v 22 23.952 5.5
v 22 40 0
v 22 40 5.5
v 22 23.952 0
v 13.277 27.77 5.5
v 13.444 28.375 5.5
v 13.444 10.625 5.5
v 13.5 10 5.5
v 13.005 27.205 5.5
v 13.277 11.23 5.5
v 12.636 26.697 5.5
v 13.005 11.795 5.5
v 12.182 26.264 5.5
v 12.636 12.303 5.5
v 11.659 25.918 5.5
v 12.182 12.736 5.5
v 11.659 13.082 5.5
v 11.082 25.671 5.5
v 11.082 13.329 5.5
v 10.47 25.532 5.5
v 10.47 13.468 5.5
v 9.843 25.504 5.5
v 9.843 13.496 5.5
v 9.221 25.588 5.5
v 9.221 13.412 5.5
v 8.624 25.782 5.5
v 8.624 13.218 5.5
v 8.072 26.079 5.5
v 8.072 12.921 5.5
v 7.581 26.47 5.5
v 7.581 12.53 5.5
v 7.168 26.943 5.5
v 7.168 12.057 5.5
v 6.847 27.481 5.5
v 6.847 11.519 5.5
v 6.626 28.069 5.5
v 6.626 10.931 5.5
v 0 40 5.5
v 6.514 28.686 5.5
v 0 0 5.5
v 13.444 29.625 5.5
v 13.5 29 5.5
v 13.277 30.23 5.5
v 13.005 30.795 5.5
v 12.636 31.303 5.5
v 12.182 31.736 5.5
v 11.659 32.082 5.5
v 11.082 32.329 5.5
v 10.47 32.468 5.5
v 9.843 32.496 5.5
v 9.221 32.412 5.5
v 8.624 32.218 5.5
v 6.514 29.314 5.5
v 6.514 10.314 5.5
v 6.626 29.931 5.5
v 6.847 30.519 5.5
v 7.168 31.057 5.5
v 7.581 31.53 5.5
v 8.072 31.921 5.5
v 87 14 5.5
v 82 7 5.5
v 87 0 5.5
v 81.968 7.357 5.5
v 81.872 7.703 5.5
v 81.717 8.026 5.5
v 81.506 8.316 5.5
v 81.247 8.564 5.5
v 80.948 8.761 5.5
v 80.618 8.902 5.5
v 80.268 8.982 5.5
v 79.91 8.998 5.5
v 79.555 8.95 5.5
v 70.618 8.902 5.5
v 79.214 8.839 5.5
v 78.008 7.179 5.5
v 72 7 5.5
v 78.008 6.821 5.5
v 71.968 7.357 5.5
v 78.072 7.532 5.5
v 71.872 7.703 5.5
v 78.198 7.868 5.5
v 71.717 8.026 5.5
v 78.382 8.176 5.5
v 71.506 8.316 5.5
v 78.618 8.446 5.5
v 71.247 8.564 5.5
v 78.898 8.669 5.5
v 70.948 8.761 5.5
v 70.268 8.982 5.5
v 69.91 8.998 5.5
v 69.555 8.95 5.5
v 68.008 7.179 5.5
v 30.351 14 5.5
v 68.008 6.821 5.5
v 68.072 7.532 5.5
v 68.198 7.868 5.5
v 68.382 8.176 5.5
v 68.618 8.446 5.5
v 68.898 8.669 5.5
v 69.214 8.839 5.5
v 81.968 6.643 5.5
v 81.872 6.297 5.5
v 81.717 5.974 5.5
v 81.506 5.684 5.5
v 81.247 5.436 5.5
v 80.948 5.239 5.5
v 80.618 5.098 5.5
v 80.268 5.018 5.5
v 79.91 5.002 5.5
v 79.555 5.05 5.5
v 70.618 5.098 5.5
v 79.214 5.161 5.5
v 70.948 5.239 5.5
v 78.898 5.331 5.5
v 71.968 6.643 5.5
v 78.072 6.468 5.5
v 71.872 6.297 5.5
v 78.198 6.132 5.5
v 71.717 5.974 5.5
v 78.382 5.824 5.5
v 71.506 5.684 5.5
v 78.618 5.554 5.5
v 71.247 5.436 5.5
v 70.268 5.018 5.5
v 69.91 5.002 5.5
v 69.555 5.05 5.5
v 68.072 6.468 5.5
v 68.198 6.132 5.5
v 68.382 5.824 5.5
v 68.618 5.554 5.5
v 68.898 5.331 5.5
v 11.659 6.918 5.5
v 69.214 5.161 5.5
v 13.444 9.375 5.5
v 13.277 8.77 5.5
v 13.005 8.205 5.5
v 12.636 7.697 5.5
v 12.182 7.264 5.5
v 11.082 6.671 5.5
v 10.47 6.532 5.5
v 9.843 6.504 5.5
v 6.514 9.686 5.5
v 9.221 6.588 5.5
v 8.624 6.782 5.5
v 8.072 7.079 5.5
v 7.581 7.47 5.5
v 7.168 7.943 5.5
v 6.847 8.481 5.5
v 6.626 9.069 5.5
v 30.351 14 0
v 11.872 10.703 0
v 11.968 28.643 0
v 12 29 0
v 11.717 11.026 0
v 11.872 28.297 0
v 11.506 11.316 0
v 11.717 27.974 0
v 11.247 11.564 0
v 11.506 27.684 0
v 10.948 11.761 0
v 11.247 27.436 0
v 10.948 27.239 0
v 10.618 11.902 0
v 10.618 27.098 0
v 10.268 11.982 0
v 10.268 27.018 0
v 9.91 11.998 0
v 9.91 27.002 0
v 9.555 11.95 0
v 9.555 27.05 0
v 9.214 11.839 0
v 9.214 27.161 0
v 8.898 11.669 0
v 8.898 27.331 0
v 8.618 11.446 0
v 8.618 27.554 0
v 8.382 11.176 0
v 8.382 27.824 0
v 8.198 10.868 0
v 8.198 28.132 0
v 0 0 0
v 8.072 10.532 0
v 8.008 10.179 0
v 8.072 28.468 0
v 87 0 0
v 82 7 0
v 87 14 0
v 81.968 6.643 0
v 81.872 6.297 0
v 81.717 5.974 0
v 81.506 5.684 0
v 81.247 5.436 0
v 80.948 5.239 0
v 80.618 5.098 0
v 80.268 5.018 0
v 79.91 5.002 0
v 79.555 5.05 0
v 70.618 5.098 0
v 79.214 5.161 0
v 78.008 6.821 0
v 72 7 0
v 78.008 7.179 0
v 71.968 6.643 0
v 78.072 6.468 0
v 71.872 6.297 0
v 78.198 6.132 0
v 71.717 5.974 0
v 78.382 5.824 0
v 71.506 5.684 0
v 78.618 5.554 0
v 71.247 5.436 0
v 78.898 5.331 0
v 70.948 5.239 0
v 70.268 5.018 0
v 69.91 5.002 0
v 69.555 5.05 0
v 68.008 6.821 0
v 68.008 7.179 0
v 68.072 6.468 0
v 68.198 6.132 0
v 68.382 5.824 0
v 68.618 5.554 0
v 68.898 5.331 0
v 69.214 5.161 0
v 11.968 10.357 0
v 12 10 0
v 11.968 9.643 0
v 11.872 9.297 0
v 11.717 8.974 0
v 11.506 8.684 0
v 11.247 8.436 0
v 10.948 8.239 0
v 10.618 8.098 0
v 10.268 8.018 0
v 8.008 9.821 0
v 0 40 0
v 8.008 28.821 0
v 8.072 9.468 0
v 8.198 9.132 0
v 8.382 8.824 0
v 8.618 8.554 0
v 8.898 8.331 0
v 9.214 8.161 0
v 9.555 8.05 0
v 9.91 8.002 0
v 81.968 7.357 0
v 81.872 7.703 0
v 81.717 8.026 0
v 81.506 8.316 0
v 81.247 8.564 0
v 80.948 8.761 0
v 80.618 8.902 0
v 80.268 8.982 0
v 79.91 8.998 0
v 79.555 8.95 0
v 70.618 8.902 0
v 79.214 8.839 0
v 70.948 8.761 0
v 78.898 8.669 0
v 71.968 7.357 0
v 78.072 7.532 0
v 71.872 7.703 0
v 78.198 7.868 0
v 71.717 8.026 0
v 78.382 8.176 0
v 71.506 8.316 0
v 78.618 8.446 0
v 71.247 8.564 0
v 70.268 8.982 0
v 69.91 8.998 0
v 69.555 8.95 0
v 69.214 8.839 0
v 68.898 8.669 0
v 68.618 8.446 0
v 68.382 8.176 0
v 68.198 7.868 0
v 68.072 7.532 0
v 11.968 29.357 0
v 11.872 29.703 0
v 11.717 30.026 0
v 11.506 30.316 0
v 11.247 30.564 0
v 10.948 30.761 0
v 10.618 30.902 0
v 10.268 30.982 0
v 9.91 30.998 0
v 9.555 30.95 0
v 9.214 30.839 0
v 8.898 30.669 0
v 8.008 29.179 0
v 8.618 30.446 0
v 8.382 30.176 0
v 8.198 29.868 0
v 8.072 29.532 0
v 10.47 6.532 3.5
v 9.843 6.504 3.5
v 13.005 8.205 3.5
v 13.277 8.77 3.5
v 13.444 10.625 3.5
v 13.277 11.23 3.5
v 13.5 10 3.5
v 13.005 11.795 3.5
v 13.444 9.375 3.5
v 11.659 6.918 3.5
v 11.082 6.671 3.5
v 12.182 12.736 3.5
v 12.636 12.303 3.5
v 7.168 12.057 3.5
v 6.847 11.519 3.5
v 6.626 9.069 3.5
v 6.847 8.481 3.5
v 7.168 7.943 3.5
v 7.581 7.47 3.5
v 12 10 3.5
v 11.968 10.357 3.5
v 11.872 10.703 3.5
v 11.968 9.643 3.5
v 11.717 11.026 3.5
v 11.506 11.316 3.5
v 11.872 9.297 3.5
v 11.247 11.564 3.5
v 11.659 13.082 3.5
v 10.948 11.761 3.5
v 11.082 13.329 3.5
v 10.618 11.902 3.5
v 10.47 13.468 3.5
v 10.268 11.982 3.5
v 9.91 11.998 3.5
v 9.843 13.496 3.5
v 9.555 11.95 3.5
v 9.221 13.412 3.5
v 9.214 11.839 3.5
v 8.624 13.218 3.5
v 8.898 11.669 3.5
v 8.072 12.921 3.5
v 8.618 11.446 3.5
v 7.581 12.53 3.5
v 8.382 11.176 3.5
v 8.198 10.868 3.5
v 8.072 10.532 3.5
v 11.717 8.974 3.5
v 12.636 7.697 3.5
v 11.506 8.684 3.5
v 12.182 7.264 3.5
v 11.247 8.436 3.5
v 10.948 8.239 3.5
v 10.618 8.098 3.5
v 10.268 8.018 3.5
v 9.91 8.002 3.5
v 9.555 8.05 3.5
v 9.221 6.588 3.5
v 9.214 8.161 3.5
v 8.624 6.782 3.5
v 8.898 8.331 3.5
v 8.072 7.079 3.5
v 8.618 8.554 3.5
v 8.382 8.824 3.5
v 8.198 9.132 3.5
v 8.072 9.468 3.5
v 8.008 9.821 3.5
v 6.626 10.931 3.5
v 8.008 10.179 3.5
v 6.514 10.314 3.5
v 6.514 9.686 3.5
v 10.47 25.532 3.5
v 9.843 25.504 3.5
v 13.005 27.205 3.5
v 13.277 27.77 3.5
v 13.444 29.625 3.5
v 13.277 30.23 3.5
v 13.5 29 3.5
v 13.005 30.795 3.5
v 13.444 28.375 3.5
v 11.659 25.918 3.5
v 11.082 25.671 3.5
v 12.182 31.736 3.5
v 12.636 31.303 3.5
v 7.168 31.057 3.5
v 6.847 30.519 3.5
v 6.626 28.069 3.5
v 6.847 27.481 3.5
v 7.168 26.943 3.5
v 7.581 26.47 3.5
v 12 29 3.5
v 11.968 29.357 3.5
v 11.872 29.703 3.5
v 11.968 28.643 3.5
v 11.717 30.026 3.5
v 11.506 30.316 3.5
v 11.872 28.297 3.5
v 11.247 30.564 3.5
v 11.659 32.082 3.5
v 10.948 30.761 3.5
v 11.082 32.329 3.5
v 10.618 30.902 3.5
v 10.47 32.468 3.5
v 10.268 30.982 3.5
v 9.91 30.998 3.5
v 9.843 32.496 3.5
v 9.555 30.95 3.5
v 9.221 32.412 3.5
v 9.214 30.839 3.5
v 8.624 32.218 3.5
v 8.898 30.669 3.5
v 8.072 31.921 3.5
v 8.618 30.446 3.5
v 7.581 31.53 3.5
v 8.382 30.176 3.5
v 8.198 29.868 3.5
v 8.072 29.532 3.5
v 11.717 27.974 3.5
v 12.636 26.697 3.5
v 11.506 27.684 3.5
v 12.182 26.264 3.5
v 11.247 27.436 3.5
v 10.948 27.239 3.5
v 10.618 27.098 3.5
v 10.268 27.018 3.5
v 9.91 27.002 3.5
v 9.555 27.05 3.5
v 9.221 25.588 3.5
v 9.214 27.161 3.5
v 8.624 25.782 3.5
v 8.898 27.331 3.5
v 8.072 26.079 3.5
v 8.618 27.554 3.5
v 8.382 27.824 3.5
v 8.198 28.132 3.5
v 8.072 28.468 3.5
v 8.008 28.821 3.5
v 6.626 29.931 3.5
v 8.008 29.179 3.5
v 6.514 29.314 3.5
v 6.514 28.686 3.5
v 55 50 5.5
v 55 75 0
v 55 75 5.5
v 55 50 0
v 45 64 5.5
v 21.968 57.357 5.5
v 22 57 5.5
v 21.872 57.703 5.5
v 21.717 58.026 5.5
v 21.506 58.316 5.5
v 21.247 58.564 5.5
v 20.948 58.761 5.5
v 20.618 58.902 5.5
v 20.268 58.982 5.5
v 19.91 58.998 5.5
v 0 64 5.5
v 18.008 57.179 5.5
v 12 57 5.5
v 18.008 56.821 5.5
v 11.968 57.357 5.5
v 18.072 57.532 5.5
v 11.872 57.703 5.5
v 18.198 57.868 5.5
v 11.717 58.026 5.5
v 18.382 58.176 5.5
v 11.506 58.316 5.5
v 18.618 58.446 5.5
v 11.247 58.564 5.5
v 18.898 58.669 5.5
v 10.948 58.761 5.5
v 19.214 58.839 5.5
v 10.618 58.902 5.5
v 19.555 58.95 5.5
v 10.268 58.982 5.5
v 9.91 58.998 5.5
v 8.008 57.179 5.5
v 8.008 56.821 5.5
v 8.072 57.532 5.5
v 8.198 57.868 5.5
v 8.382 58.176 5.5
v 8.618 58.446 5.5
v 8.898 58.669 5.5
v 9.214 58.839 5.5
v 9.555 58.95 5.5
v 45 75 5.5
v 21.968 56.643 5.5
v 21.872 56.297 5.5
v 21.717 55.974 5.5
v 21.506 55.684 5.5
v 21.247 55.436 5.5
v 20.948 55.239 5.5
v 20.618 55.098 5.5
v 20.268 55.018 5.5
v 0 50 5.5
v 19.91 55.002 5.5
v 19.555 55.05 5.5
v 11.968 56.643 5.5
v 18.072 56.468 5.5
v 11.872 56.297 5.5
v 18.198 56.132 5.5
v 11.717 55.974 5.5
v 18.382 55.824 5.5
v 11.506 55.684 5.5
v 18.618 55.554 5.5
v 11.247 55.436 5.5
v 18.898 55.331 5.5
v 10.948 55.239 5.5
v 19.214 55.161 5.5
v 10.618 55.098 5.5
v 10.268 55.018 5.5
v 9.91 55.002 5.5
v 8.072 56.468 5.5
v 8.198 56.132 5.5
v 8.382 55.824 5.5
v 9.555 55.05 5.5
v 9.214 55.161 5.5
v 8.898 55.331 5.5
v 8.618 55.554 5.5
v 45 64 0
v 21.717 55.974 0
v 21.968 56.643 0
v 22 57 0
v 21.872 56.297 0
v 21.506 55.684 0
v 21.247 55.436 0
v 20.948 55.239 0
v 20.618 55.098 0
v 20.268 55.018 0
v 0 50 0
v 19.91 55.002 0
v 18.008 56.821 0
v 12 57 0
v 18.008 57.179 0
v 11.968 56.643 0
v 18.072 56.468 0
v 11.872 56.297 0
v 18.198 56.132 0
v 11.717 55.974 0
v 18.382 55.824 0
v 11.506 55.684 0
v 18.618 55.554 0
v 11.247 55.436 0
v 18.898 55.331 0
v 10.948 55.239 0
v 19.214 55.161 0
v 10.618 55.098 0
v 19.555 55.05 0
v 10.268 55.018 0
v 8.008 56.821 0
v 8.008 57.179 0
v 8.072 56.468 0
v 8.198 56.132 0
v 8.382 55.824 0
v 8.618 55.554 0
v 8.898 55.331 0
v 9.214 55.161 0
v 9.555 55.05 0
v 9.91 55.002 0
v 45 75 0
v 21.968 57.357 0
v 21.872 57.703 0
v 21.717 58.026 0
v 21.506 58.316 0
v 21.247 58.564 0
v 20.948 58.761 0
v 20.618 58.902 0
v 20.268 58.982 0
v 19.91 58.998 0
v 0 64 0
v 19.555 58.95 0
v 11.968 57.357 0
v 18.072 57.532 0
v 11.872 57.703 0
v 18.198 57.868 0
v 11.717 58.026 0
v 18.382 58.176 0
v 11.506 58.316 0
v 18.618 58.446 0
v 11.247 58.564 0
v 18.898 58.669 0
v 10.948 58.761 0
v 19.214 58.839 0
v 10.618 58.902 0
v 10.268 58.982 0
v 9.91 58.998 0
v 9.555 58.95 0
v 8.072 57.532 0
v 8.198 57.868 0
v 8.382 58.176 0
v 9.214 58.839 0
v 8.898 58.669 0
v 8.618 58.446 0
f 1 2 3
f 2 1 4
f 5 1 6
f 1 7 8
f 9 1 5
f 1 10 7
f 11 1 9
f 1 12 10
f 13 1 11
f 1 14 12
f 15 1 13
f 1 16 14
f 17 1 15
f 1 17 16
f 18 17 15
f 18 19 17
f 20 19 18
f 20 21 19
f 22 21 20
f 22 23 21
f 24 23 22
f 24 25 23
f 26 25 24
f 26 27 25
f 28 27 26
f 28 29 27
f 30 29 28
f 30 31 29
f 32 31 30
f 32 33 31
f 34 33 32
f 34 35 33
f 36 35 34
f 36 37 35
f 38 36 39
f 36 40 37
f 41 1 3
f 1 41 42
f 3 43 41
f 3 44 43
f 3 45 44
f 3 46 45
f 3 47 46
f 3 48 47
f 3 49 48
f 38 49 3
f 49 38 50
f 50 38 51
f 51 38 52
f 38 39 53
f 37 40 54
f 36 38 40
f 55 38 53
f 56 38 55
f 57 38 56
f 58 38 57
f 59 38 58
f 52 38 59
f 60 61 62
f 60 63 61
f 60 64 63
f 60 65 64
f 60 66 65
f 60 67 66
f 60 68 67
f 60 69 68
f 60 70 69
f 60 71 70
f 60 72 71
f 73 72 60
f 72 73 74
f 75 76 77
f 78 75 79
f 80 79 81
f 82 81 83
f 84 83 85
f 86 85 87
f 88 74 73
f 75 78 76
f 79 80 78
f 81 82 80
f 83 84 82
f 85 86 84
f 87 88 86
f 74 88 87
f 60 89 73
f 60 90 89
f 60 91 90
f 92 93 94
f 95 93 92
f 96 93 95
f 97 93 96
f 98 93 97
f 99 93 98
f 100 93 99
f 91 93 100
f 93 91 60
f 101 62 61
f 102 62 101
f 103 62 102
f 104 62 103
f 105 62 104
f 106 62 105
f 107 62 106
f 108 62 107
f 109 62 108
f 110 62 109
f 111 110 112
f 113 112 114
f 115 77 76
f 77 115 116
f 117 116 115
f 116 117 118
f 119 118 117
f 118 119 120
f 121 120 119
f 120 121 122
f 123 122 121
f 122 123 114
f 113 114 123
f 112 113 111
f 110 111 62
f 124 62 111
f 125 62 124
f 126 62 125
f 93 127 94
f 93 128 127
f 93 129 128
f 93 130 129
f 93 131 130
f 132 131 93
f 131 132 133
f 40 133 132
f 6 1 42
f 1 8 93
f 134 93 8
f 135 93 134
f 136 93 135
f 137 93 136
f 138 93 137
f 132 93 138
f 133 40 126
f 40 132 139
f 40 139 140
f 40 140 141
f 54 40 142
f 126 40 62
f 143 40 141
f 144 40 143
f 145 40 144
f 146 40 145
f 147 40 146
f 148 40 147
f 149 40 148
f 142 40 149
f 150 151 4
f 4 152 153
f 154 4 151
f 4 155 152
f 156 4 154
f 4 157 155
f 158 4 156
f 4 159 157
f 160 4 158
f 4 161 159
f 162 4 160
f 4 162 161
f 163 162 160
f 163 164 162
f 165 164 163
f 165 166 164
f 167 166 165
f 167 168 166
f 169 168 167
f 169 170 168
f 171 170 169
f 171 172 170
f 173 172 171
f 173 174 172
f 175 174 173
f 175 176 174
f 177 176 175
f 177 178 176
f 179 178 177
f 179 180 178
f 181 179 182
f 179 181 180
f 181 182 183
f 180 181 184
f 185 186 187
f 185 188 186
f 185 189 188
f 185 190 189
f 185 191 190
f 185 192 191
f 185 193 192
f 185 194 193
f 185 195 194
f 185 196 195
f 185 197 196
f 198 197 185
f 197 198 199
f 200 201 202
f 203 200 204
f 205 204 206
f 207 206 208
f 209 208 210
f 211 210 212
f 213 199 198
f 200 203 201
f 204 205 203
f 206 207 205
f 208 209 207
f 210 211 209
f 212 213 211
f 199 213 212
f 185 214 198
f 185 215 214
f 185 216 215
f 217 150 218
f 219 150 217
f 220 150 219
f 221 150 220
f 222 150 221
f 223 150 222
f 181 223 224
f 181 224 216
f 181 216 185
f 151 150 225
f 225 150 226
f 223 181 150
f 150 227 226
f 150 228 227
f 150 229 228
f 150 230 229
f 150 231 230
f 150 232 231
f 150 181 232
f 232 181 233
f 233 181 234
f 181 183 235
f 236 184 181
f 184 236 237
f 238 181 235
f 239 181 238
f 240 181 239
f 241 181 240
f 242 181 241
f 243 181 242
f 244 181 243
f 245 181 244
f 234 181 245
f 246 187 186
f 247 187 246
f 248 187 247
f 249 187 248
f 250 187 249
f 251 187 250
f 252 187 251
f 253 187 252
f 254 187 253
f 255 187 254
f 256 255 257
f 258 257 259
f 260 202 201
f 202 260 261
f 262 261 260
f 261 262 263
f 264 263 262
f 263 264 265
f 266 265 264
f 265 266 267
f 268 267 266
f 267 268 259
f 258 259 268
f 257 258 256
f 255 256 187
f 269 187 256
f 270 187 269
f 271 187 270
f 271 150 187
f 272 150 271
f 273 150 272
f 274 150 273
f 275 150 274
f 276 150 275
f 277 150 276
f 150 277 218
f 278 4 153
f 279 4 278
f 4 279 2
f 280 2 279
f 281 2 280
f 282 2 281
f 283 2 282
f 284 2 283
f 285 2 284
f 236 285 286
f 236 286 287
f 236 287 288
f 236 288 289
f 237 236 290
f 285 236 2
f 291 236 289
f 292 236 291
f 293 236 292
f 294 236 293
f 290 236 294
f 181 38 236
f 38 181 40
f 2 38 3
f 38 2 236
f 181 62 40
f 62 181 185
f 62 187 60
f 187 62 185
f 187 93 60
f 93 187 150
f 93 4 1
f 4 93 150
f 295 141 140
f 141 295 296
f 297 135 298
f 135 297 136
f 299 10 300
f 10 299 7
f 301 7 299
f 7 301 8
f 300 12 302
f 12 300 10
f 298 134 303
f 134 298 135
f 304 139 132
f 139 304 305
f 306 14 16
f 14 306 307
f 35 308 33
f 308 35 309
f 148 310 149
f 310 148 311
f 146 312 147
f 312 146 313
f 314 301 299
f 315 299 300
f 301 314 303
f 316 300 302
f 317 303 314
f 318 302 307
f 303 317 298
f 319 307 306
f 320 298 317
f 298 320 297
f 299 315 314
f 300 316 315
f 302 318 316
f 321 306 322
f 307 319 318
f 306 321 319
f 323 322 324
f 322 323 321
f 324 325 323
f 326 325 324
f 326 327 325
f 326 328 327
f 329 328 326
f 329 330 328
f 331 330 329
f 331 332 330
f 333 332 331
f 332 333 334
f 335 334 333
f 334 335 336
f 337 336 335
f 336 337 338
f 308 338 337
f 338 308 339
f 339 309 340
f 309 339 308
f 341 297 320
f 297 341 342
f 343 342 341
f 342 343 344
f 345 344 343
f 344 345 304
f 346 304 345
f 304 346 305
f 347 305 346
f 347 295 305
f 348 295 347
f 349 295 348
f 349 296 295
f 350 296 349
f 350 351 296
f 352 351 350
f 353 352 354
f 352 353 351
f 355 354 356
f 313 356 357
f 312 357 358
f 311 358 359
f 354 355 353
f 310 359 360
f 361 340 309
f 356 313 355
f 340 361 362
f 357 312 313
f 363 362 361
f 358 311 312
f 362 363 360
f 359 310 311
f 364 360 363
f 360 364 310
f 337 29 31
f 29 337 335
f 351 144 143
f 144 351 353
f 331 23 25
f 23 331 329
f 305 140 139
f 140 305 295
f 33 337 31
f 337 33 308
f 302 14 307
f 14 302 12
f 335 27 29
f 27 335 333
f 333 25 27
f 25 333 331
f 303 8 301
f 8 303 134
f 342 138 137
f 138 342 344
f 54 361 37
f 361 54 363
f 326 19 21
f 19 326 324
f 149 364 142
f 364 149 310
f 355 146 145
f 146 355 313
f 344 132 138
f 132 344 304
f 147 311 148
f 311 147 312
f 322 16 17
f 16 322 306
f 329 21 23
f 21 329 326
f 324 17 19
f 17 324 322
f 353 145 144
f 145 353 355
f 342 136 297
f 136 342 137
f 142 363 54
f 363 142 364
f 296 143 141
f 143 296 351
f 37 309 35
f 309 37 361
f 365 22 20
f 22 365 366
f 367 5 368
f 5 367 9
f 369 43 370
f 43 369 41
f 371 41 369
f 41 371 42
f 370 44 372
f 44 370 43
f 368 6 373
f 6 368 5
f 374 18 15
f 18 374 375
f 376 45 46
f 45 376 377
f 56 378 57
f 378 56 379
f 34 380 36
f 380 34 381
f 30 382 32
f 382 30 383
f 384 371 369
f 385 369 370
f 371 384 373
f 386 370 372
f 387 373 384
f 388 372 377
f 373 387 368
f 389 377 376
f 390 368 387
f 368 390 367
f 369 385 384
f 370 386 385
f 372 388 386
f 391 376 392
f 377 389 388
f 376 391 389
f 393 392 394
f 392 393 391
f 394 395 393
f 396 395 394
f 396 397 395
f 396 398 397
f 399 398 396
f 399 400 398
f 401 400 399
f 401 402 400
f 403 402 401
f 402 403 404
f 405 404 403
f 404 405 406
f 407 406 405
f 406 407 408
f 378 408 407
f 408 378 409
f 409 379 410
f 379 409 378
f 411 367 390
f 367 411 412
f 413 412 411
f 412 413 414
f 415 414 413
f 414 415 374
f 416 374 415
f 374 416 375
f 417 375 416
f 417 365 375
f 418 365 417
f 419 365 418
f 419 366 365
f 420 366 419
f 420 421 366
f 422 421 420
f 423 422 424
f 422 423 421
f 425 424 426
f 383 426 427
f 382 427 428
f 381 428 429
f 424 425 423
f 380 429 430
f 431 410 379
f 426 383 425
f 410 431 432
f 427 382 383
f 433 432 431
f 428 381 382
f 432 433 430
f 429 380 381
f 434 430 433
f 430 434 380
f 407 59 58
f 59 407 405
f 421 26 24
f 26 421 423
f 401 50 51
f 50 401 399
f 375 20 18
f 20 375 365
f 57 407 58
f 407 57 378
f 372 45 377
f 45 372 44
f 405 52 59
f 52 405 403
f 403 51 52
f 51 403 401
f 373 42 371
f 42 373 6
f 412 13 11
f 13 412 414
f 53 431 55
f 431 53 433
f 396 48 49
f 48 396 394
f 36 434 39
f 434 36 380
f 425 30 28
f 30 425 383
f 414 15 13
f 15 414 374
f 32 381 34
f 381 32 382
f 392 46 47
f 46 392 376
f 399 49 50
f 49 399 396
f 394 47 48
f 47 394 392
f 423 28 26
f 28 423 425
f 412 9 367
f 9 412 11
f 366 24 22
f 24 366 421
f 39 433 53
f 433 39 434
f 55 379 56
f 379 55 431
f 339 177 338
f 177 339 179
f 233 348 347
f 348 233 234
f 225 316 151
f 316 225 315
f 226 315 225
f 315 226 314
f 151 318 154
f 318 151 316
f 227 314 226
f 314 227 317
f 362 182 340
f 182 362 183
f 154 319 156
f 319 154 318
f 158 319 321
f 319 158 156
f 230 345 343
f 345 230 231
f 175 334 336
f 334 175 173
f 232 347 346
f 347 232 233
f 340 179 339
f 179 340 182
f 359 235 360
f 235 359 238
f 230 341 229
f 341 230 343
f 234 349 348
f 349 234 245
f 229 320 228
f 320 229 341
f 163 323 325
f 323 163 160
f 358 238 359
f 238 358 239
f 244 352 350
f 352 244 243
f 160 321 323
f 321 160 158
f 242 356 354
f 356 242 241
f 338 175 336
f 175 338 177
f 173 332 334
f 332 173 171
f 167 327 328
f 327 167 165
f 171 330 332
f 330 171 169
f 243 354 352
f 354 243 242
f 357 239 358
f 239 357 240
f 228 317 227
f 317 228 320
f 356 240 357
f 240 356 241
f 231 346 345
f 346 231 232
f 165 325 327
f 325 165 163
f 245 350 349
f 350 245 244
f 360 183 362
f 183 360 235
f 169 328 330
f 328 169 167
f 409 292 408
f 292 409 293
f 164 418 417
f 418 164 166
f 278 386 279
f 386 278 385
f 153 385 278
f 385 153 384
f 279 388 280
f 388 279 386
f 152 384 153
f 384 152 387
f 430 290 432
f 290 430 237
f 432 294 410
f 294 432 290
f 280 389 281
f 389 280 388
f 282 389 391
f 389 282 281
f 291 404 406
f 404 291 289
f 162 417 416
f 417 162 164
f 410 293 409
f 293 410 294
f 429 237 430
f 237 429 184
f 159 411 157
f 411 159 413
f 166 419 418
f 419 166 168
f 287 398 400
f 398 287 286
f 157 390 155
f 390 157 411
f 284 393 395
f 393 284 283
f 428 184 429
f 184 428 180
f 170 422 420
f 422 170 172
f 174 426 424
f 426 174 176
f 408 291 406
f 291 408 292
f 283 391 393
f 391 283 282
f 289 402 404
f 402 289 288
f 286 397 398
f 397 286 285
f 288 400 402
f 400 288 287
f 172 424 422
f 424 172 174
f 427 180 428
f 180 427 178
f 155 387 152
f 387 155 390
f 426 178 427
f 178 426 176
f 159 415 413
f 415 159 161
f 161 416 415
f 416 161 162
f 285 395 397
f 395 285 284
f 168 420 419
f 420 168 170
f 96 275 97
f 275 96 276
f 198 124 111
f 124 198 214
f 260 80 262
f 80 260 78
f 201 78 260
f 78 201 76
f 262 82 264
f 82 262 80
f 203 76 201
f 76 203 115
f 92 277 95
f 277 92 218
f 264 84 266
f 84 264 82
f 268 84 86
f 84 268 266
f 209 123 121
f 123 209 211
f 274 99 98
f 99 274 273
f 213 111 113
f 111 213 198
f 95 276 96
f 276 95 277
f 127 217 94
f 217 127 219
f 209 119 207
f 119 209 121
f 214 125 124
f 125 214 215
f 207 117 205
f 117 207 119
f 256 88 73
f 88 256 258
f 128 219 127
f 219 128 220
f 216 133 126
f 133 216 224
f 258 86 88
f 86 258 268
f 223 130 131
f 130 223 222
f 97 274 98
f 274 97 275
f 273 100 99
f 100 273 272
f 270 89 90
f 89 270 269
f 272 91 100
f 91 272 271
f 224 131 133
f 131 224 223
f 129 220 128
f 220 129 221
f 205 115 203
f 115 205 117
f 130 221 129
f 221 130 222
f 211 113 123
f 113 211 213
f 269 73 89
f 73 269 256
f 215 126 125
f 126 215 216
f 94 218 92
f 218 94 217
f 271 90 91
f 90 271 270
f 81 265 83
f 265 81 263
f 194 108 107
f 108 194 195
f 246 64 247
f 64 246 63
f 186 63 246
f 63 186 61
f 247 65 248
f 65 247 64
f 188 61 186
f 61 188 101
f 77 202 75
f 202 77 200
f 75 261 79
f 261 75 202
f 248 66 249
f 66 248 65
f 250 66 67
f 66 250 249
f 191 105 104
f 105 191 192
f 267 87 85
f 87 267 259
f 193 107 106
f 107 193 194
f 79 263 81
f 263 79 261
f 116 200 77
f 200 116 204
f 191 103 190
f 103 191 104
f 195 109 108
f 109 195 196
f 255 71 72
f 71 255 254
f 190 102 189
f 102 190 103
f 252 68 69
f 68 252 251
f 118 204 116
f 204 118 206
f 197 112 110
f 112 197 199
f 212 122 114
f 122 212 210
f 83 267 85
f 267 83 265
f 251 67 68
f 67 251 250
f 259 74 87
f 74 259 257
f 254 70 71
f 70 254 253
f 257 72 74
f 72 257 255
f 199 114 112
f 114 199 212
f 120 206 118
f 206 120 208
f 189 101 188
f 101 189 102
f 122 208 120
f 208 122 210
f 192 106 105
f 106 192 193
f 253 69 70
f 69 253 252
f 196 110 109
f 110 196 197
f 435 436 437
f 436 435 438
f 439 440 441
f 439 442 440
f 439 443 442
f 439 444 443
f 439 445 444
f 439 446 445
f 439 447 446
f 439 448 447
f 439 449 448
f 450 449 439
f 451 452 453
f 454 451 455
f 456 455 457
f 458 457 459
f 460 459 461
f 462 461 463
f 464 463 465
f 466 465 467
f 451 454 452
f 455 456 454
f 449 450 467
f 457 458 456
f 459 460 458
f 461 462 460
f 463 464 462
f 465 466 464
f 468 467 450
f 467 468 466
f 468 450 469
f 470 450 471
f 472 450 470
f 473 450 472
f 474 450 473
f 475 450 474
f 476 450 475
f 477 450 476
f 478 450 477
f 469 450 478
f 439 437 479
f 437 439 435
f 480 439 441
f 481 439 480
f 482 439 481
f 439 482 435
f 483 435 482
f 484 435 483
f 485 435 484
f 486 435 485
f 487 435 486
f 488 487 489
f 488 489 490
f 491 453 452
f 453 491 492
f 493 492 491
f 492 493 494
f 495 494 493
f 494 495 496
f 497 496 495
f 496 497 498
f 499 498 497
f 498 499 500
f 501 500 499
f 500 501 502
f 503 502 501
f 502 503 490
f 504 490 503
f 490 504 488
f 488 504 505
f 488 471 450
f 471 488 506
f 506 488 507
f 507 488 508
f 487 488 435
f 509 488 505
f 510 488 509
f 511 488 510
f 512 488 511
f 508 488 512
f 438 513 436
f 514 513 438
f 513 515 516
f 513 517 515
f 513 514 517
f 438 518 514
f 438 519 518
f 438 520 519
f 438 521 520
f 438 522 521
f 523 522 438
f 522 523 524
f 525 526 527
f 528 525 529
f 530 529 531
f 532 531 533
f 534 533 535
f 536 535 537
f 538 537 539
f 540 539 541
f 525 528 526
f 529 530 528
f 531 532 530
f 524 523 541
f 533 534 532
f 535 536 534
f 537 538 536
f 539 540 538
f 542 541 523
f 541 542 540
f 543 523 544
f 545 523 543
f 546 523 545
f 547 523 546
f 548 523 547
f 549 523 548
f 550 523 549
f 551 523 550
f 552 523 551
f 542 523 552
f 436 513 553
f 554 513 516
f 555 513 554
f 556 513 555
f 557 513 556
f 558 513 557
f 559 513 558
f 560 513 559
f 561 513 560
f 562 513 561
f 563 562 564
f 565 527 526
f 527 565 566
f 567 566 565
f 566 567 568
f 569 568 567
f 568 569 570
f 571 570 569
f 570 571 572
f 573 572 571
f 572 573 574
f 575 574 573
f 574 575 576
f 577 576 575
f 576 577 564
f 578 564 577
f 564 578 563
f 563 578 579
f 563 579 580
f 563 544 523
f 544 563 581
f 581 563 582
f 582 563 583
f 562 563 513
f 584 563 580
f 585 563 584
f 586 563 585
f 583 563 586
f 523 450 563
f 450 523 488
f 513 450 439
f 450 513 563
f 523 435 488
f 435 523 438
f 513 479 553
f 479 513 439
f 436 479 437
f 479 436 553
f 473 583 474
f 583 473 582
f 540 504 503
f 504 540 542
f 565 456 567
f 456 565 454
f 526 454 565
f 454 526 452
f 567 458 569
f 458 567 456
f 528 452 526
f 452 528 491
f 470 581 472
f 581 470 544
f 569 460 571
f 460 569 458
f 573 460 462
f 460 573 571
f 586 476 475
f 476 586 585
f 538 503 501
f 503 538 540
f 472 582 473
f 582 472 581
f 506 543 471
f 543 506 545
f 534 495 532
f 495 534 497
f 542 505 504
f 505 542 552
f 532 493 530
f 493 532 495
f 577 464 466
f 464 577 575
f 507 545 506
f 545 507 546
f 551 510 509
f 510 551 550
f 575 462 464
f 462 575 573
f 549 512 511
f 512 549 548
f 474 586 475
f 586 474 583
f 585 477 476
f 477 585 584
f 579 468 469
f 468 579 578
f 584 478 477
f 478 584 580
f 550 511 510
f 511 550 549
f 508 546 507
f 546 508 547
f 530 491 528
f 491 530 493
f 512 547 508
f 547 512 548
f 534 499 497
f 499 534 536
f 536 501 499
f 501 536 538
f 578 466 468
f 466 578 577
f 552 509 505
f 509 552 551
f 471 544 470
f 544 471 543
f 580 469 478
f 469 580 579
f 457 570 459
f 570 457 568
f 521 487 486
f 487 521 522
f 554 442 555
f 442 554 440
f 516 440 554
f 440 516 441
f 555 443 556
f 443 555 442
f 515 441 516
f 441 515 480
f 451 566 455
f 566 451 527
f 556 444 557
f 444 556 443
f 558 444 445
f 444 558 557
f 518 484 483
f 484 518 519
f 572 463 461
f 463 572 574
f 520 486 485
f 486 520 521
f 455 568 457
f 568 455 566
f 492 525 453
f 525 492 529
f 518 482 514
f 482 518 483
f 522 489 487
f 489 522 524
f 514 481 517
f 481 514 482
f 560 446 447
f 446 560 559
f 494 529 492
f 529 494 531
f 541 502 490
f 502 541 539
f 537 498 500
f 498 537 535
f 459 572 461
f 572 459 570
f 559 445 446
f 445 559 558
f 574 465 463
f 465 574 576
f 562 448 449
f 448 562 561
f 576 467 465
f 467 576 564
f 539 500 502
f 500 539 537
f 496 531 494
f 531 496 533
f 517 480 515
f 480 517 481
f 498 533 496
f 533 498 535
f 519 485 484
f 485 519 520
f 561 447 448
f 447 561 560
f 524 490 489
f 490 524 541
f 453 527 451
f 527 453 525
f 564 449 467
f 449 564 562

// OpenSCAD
//spool holder that attaches to the side of a kossel 2020 with m3 t nuts

$fn = 35;

screw_diameter = 4;
screw_head = 7;
screw_head_height = 2;
height = 5.5;


    
difference(){
    union(){
        cube([22,40,height]);
        
        //arm for spool holder
        translate([0,0,0]) cube([87,14,height]);
        
        //support for extrusion attachment and main arm
        translate([20,3,0]) rotate(40) cube([15,15,height]);
    }
    
    //screw head holes for extrusion mounting
    translate([10,10,height-screw_head_height]) cylinder(height+20,d=screw_head);  
    translate([10,29,height-screw_head_height]) cylinder(height+20,d=screw_head);
    
    //screw holes for mounting to extrusion
    translate([10,10,-1]) cylinder(height+2,d=screw_diameter);  
    translate([10,29,-1]) cylinder(height+2,d=screw_diameter);

    //extension screw holes
    translate([70,7,-1]) cylinder(height+2,d=screw_diameter);
    translate([80,7,-1]) cylinder(height+2,d=screw_diameter);
    }

offset = 50;    
    
translate([0,offset,0])    
difference(){
    union(){
        cube([55,14,height]);
        
        //prevents spool from falling off
        translate([45,0,0]) cube([10,25,height]);
        }
    //screw holes
    translate([10,7,0]) cylinder(height+2,d=screw_diameter);
    translate([20,7,0]) cylinder(height+2,d=screw_diameter);
    }
